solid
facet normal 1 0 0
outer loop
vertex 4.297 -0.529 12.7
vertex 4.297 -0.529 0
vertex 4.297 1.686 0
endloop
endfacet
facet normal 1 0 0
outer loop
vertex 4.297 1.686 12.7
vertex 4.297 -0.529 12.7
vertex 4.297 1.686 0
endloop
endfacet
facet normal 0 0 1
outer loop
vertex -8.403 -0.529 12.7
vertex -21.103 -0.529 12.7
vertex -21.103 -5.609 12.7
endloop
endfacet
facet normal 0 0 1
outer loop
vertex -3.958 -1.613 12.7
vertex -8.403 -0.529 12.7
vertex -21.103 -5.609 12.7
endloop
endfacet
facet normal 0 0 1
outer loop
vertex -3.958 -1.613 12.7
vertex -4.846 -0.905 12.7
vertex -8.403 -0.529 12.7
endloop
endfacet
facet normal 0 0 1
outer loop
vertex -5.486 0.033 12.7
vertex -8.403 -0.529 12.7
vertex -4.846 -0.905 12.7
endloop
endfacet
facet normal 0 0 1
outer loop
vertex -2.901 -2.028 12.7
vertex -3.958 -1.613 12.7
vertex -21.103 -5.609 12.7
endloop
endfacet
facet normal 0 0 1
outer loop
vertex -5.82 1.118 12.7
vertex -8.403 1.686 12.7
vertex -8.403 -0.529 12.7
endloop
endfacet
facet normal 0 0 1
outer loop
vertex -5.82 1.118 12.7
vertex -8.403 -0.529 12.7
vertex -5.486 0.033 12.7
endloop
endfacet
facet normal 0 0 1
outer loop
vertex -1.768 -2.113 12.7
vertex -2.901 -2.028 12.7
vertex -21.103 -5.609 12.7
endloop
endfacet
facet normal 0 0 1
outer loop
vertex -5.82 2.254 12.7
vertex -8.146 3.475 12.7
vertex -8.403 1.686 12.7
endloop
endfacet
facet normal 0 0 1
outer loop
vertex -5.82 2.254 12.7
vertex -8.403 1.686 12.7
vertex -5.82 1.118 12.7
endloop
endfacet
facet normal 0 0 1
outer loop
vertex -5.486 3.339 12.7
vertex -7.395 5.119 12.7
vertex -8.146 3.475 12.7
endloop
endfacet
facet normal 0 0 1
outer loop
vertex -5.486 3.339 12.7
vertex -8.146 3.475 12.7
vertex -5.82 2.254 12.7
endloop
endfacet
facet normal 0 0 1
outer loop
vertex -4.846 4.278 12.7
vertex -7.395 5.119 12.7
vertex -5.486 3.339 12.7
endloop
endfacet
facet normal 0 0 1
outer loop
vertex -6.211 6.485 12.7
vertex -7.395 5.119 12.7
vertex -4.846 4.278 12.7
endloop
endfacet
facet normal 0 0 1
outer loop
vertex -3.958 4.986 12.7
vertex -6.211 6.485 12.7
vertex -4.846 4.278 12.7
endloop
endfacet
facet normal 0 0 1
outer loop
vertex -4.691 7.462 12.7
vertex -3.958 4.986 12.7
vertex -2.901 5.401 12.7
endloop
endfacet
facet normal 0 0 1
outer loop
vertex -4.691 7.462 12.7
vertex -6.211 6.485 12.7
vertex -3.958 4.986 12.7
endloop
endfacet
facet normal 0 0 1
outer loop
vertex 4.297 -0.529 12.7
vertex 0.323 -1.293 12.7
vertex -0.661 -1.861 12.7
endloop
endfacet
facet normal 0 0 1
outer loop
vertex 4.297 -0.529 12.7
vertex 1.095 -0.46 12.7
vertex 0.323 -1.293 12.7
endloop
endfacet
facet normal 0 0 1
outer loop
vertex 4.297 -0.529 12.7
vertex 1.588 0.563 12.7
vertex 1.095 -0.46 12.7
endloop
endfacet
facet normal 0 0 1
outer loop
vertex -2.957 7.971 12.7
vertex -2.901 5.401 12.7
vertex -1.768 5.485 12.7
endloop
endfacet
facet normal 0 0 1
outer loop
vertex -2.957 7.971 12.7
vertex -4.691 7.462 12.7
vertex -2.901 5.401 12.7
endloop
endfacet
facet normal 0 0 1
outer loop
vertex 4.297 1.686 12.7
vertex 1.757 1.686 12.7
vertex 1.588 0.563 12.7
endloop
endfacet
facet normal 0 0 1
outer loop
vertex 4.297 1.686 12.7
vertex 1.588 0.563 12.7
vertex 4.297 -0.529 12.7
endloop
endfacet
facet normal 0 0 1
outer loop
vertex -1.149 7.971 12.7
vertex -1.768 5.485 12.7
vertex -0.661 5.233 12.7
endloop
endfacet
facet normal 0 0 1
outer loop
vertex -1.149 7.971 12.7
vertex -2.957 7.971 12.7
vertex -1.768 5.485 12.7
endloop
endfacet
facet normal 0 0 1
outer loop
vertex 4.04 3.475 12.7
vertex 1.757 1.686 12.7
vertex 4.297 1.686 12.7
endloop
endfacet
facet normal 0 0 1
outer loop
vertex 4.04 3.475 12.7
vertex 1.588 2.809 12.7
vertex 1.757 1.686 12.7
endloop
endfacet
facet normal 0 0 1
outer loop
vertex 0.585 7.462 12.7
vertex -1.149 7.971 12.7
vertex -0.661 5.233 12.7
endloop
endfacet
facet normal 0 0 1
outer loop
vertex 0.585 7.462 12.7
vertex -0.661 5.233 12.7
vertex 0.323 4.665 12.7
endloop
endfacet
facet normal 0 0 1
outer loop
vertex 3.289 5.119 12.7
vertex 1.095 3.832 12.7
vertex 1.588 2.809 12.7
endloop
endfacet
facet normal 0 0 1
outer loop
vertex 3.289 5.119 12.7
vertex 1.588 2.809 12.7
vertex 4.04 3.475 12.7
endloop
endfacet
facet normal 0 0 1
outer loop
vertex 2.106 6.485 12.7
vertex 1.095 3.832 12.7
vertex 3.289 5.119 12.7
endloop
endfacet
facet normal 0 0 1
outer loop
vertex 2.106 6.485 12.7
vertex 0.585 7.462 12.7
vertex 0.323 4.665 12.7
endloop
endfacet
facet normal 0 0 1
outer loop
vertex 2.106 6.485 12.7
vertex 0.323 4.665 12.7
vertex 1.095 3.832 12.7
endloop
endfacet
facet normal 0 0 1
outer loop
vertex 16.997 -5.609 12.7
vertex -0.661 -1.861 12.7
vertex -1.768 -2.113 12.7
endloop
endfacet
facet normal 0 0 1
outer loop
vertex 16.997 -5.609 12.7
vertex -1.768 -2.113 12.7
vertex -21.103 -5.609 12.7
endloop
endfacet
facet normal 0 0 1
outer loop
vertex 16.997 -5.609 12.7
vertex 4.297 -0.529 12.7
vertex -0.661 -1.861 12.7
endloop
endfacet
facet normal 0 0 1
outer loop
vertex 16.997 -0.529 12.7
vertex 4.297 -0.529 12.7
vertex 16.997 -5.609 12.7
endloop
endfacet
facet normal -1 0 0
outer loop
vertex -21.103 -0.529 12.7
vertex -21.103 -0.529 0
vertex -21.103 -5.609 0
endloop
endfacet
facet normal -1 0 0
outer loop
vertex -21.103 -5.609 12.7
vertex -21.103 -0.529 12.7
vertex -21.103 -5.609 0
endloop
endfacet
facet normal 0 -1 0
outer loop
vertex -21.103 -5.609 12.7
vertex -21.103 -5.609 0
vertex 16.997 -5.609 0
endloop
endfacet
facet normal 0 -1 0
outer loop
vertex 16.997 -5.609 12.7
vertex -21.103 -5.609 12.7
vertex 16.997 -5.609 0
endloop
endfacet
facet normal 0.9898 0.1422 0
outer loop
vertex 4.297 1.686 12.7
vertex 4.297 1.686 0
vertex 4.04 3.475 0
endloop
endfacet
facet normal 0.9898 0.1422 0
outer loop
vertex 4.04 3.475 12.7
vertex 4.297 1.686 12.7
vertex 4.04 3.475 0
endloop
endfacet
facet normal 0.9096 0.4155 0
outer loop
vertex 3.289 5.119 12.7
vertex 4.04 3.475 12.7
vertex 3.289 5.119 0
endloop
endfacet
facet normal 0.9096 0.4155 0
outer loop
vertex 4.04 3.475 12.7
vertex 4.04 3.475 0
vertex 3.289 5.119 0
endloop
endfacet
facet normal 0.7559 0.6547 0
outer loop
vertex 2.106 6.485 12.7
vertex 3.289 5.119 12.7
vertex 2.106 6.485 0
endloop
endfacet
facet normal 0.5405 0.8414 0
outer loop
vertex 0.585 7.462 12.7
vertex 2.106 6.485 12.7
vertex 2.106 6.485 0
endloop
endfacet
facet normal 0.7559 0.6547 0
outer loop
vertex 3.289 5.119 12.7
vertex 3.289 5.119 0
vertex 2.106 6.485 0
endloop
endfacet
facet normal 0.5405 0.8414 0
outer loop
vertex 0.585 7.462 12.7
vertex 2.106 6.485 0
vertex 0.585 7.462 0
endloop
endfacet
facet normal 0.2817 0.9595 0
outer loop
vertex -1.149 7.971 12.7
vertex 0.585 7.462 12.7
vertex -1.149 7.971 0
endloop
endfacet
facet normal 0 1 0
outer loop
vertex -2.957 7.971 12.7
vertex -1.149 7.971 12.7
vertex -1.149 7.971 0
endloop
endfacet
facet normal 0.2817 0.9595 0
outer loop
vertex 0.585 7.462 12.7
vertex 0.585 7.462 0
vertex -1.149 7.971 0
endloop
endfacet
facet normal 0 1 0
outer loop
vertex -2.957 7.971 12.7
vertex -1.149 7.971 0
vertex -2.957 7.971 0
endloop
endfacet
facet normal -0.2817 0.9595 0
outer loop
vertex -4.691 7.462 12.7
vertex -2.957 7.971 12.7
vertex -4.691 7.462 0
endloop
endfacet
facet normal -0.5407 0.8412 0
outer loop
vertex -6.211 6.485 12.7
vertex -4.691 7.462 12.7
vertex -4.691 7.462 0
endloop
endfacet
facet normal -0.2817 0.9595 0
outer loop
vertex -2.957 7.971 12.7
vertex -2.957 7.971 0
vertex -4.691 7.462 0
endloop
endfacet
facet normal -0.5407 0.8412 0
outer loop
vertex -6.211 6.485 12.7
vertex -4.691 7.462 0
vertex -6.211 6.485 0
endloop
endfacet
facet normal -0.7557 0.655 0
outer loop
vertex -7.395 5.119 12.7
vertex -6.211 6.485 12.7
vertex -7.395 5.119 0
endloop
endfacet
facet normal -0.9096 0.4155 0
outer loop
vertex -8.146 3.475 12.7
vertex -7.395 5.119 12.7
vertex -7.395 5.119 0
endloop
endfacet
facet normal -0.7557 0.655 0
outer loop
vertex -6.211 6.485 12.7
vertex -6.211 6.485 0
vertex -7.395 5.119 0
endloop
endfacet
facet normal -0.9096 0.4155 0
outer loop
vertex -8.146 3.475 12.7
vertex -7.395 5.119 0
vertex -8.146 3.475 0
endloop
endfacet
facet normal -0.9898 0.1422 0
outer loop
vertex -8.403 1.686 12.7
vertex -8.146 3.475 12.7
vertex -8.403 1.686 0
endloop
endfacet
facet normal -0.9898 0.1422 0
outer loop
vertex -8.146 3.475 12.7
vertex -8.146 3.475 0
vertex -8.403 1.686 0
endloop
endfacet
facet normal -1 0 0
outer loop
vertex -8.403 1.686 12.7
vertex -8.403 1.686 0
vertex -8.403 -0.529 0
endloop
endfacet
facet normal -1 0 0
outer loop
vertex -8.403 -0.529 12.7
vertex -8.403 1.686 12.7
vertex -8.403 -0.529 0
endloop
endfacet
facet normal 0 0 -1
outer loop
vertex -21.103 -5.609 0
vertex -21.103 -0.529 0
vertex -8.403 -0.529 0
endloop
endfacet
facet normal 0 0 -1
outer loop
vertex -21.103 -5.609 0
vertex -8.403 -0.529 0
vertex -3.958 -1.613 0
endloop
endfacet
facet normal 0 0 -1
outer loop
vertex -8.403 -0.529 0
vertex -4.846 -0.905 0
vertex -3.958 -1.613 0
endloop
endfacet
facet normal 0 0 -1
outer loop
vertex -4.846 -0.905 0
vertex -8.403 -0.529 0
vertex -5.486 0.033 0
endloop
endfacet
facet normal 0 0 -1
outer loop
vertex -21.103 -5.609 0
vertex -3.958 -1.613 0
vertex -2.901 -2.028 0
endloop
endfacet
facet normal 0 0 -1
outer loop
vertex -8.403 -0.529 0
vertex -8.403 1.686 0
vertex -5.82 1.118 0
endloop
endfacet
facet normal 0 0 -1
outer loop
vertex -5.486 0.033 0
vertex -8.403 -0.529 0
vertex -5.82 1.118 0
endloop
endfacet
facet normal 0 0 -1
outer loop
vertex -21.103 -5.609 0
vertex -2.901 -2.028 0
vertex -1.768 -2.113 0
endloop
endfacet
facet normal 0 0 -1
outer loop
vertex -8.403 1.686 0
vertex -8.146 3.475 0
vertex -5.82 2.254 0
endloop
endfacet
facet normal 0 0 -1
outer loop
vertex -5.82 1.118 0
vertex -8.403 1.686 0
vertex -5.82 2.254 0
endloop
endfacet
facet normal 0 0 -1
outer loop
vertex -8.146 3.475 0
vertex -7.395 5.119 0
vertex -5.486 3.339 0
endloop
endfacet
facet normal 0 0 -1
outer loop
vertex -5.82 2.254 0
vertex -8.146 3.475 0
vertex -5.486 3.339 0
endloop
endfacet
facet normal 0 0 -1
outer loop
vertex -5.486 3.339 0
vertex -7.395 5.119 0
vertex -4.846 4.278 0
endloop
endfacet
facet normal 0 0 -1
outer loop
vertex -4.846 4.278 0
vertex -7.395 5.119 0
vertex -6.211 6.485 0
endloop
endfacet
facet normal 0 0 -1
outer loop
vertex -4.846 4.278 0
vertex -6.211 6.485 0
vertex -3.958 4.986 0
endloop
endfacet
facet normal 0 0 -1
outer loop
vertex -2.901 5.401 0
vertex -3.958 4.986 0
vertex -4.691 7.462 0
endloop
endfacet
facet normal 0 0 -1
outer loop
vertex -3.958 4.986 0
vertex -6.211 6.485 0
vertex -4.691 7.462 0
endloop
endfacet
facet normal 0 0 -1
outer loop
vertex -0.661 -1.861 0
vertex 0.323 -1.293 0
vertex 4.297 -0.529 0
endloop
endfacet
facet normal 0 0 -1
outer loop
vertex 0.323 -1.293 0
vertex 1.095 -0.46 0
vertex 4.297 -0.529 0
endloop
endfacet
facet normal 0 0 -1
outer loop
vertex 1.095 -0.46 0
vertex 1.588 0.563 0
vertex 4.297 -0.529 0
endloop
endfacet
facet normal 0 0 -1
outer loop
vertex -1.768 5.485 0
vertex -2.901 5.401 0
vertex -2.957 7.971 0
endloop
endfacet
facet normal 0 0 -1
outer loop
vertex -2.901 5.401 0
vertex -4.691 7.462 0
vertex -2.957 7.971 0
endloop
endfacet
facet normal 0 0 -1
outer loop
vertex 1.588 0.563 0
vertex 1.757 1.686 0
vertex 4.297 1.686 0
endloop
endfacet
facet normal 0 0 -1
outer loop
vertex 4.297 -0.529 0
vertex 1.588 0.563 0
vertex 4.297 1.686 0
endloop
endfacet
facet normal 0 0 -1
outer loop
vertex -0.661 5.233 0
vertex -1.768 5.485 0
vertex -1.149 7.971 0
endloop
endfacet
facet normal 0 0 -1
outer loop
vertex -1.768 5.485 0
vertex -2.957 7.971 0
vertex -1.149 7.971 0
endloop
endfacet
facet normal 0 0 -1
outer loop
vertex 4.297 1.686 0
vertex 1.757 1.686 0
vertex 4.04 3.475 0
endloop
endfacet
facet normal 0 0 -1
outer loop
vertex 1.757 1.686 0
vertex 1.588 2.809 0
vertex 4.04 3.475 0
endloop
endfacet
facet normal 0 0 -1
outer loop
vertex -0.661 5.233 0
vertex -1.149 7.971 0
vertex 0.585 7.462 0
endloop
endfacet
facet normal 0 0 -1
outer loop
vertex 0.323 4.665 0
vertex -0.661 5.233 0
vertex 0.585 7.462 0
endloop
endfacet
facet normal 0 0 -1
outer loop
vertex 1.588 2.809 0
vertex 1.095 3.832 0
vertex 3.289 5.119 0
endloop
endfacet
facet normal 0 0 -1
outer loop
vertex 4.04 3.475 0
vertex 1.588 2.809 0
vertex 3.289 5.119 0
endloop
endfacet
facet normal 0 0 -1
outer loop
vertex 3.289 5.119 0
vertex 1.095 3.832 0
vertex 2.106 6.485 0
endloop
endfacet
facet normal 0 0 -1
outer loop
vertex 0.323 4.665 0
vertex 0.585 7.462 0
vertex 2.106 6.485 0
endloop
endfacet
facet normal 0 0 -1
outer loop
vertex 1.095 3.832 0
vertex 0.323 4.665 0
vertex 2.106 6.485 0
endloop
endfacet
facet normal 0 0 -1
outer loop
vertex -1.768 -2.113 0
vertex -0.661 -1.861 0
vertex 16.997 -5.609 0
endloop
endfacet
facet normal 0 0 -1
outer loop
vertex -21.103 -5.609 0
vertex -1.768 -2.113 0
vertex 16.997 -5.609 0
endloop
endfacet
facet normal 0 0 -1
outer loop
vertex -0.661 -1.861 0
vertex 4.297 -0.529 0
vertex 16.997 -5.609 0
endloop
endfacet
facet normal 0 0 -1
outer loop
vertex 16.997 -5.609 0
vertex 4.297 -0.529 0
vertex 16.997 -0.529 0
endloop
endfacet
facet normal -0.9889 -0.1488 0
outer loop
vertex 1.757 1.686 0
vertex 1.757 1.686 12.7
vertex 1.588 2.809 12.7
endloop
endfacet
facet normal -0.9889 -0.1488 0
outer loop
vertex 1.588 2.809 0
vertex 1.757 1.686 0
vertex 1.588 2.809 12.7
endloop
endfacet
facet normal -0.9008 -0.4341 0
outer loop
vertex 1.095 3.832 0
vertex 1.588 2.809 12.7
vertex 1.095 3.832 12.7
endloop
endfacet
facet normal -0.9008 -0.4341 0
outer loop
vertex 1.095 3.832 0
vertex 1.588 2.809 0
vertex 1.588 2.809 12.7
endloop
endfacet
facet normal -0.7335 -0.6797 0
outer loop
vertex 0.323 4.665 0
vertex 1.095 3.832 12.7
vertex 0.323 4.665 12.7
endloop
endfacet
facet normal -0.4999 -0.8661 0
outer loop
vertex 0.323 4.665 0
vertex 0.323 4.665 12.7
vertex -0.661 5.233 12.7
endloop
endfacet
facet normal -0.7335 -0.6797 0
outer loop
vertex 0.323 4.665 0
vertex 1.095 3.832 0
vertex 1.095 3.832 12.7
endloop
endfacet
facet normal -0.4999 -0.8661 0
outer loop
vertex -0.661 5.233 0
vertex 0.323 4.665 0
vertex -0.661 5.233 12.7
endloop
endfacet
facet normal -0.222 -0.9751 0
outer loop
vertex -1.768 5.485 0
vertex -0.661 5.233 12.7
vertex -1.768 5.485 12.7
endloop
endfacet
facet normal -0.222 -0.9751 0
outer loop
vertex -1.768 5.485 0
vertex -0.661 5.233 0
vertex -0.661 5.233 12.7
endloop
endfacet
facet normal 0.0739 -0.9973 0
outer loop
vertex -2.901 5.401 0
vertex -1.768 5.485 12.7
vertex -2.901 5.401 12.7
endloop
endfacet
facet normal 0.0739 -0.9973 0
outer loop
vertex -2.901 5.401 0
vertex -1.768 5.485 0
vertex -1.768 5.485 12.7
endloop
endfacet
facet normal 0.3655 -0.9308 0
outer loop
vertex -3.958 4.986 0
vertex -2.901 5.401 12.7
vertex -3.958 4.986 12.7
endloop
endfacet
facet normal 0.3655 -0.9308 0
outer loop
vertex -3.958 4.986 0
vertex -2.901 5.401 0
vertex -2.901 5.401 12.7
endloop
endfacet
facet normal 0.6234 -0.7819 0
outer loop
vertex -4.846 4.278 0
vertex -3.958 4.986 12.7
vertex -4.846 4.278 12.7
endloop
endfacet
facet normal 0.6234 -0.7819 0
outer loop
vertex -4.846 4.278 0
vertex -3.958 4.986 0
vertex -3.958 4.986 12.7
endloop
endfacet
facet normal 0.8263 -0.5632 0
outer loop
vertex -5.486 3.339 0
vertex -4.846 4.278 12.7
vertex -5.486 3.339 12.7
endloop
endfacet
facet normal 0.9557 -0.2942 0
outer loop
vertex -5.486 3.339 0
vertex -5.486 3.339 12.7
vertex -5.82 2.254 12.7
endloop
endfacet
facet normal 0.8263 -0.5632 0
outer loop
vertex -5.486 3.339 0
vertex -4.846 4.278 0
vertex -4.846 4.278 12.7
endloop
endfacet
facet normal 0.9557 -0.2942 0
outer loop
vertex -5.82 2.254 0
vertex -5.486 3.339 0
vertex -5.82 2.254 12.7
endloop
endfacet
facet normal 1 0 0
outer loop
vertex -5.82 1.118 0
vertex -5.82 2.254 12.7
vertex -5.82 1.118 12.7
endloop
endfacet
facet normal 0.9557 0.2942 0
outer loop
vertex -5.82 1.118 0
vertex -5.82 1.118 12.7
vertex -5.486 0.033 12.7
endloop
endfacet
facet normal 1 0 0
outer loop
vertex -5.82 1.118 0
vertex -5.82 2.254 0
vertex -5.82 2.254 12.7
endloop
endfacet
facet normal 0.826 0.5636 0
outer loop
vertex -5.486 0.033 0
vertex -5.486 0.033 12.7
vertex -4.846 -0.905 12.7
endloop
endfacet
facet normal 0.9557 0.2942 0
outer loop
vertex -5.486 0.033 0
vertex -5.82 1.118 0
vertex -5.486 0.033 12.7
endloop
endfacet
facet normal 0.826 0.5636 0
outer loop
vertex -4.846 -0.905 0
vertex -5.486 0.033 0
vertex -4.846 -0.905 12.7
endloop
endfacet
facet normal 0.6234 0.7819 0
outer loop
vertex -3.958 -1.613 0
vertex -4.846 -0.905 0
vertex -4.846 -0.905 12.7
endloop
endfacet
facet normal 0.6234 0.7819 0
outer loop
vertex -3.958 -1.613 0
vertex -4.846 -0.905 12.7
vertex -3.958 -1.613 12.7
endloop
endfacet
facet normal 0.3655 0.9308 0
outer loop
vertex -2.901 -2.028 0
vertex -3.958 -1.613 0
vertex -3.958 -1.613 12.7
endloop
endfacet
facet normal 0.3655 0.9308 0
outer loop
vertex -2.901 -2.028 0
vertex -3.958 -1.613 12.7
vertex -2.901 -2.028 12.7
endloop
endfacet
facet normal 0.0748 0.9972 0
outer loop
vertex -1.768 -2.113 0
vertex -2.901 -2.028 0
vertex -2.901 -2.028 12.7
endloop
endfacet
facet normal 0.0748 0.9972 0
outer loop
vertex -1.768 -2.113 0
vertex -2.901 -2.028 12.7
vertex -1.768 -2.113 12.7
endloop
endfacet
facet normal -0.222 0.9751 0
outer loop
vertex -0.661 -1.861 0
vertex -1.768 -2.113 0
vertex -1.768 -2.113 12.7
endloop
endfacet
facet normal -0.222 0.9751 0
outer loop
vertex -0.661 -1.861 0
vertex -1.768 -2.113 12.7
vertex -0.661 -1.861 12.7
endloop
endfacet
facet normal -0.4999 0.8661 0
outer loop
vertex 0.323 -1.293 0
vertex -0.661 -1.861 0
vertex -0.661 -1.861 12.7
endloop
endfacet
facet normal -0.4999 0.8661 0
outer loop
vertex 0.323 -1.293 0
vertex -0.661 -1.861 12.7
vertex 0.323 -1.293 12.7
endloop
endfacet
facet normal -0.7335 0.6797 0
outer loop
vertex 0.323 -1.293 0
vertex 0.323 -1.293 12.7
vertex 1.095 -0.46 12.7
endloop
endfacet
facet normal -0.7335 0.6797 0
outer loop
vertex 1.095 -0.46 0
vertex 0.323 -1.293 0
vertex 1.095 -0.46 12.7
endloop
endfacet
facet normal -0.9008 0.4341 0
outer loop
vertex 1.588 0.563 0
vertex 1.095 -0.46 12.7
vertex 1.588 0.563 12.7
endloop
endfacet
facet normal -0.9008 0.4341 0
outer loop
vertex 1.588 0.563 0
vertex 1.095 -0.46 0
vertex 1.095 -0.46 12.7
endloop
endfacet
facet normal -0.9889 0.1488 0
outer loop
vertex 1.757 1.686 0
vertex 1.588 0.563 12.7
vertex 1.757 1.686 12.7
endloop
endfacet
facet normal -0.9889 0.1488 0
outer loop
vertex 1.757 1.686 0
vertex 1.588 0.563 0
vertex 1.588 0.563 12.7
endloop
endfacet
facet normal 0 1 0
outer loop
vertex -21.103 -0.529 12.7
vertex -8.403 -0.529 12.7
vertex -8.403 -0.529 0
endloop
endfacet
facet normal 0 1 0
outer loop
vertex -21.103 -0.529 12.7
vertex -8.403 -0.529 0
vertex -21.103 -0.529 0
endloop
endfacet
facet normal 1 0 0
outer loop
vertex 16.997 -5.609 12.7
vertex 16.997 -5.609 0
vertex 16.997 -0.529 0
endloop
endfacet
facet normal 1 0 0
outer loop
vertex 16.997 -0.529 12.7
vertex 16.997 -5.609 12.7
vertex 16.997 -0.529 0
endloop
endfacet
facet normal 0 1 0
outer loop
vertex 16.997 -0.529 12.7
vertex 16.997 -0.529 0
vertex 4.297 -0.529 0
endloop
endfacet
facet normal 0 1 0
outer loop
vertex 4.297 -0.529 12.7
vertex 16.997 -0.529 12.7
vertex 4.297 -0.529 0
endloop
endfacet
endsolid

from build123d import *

# Parameters (mm, degrees)
SKETCH1_R           = 3.81
BOSS_EXTRUDE1_DEPTH = 12.7


with BuildPart() as part:
    # Sketch1 → Boss-Extrude1 (new body)
    with BuildSketch(Plane.XY):
        with BuildLine():
            Line((-21.102851537, -0.529390312), (-21.102851537, -5.609390312))
            Line((-21.102851537, -5.609390312), (16.997148463, -5.609390312))
            Line((16.997148463, -5.609390312), (16.997148463, -0.529390312))
            Line((16.997148463, -0.529390312), (4.297148463, -0.529390312))
            Line((4.297148463, -0.529390312), (4.297148463, 1.686095421))
            ThreePointArc((4.297148463, 1.686095421), (-2.052851537, 8.036095421), (-8.402851537, 1.686095421))
            Line((-8.402851537, 1.686095421), (-8.402851537, -0.529390312))
            Line((-8.402851537, -0.529390312), (-21.102851537, -0.529390312))
        make_face()
        with Locations((-2.052851537, 1.686095421)):
            Circle(SKETCH1_R, mode=Mode.SUBTRACT)
    extrude(amount=BOSS_EXTRUDE1_DEPTH)


solid = part.part
